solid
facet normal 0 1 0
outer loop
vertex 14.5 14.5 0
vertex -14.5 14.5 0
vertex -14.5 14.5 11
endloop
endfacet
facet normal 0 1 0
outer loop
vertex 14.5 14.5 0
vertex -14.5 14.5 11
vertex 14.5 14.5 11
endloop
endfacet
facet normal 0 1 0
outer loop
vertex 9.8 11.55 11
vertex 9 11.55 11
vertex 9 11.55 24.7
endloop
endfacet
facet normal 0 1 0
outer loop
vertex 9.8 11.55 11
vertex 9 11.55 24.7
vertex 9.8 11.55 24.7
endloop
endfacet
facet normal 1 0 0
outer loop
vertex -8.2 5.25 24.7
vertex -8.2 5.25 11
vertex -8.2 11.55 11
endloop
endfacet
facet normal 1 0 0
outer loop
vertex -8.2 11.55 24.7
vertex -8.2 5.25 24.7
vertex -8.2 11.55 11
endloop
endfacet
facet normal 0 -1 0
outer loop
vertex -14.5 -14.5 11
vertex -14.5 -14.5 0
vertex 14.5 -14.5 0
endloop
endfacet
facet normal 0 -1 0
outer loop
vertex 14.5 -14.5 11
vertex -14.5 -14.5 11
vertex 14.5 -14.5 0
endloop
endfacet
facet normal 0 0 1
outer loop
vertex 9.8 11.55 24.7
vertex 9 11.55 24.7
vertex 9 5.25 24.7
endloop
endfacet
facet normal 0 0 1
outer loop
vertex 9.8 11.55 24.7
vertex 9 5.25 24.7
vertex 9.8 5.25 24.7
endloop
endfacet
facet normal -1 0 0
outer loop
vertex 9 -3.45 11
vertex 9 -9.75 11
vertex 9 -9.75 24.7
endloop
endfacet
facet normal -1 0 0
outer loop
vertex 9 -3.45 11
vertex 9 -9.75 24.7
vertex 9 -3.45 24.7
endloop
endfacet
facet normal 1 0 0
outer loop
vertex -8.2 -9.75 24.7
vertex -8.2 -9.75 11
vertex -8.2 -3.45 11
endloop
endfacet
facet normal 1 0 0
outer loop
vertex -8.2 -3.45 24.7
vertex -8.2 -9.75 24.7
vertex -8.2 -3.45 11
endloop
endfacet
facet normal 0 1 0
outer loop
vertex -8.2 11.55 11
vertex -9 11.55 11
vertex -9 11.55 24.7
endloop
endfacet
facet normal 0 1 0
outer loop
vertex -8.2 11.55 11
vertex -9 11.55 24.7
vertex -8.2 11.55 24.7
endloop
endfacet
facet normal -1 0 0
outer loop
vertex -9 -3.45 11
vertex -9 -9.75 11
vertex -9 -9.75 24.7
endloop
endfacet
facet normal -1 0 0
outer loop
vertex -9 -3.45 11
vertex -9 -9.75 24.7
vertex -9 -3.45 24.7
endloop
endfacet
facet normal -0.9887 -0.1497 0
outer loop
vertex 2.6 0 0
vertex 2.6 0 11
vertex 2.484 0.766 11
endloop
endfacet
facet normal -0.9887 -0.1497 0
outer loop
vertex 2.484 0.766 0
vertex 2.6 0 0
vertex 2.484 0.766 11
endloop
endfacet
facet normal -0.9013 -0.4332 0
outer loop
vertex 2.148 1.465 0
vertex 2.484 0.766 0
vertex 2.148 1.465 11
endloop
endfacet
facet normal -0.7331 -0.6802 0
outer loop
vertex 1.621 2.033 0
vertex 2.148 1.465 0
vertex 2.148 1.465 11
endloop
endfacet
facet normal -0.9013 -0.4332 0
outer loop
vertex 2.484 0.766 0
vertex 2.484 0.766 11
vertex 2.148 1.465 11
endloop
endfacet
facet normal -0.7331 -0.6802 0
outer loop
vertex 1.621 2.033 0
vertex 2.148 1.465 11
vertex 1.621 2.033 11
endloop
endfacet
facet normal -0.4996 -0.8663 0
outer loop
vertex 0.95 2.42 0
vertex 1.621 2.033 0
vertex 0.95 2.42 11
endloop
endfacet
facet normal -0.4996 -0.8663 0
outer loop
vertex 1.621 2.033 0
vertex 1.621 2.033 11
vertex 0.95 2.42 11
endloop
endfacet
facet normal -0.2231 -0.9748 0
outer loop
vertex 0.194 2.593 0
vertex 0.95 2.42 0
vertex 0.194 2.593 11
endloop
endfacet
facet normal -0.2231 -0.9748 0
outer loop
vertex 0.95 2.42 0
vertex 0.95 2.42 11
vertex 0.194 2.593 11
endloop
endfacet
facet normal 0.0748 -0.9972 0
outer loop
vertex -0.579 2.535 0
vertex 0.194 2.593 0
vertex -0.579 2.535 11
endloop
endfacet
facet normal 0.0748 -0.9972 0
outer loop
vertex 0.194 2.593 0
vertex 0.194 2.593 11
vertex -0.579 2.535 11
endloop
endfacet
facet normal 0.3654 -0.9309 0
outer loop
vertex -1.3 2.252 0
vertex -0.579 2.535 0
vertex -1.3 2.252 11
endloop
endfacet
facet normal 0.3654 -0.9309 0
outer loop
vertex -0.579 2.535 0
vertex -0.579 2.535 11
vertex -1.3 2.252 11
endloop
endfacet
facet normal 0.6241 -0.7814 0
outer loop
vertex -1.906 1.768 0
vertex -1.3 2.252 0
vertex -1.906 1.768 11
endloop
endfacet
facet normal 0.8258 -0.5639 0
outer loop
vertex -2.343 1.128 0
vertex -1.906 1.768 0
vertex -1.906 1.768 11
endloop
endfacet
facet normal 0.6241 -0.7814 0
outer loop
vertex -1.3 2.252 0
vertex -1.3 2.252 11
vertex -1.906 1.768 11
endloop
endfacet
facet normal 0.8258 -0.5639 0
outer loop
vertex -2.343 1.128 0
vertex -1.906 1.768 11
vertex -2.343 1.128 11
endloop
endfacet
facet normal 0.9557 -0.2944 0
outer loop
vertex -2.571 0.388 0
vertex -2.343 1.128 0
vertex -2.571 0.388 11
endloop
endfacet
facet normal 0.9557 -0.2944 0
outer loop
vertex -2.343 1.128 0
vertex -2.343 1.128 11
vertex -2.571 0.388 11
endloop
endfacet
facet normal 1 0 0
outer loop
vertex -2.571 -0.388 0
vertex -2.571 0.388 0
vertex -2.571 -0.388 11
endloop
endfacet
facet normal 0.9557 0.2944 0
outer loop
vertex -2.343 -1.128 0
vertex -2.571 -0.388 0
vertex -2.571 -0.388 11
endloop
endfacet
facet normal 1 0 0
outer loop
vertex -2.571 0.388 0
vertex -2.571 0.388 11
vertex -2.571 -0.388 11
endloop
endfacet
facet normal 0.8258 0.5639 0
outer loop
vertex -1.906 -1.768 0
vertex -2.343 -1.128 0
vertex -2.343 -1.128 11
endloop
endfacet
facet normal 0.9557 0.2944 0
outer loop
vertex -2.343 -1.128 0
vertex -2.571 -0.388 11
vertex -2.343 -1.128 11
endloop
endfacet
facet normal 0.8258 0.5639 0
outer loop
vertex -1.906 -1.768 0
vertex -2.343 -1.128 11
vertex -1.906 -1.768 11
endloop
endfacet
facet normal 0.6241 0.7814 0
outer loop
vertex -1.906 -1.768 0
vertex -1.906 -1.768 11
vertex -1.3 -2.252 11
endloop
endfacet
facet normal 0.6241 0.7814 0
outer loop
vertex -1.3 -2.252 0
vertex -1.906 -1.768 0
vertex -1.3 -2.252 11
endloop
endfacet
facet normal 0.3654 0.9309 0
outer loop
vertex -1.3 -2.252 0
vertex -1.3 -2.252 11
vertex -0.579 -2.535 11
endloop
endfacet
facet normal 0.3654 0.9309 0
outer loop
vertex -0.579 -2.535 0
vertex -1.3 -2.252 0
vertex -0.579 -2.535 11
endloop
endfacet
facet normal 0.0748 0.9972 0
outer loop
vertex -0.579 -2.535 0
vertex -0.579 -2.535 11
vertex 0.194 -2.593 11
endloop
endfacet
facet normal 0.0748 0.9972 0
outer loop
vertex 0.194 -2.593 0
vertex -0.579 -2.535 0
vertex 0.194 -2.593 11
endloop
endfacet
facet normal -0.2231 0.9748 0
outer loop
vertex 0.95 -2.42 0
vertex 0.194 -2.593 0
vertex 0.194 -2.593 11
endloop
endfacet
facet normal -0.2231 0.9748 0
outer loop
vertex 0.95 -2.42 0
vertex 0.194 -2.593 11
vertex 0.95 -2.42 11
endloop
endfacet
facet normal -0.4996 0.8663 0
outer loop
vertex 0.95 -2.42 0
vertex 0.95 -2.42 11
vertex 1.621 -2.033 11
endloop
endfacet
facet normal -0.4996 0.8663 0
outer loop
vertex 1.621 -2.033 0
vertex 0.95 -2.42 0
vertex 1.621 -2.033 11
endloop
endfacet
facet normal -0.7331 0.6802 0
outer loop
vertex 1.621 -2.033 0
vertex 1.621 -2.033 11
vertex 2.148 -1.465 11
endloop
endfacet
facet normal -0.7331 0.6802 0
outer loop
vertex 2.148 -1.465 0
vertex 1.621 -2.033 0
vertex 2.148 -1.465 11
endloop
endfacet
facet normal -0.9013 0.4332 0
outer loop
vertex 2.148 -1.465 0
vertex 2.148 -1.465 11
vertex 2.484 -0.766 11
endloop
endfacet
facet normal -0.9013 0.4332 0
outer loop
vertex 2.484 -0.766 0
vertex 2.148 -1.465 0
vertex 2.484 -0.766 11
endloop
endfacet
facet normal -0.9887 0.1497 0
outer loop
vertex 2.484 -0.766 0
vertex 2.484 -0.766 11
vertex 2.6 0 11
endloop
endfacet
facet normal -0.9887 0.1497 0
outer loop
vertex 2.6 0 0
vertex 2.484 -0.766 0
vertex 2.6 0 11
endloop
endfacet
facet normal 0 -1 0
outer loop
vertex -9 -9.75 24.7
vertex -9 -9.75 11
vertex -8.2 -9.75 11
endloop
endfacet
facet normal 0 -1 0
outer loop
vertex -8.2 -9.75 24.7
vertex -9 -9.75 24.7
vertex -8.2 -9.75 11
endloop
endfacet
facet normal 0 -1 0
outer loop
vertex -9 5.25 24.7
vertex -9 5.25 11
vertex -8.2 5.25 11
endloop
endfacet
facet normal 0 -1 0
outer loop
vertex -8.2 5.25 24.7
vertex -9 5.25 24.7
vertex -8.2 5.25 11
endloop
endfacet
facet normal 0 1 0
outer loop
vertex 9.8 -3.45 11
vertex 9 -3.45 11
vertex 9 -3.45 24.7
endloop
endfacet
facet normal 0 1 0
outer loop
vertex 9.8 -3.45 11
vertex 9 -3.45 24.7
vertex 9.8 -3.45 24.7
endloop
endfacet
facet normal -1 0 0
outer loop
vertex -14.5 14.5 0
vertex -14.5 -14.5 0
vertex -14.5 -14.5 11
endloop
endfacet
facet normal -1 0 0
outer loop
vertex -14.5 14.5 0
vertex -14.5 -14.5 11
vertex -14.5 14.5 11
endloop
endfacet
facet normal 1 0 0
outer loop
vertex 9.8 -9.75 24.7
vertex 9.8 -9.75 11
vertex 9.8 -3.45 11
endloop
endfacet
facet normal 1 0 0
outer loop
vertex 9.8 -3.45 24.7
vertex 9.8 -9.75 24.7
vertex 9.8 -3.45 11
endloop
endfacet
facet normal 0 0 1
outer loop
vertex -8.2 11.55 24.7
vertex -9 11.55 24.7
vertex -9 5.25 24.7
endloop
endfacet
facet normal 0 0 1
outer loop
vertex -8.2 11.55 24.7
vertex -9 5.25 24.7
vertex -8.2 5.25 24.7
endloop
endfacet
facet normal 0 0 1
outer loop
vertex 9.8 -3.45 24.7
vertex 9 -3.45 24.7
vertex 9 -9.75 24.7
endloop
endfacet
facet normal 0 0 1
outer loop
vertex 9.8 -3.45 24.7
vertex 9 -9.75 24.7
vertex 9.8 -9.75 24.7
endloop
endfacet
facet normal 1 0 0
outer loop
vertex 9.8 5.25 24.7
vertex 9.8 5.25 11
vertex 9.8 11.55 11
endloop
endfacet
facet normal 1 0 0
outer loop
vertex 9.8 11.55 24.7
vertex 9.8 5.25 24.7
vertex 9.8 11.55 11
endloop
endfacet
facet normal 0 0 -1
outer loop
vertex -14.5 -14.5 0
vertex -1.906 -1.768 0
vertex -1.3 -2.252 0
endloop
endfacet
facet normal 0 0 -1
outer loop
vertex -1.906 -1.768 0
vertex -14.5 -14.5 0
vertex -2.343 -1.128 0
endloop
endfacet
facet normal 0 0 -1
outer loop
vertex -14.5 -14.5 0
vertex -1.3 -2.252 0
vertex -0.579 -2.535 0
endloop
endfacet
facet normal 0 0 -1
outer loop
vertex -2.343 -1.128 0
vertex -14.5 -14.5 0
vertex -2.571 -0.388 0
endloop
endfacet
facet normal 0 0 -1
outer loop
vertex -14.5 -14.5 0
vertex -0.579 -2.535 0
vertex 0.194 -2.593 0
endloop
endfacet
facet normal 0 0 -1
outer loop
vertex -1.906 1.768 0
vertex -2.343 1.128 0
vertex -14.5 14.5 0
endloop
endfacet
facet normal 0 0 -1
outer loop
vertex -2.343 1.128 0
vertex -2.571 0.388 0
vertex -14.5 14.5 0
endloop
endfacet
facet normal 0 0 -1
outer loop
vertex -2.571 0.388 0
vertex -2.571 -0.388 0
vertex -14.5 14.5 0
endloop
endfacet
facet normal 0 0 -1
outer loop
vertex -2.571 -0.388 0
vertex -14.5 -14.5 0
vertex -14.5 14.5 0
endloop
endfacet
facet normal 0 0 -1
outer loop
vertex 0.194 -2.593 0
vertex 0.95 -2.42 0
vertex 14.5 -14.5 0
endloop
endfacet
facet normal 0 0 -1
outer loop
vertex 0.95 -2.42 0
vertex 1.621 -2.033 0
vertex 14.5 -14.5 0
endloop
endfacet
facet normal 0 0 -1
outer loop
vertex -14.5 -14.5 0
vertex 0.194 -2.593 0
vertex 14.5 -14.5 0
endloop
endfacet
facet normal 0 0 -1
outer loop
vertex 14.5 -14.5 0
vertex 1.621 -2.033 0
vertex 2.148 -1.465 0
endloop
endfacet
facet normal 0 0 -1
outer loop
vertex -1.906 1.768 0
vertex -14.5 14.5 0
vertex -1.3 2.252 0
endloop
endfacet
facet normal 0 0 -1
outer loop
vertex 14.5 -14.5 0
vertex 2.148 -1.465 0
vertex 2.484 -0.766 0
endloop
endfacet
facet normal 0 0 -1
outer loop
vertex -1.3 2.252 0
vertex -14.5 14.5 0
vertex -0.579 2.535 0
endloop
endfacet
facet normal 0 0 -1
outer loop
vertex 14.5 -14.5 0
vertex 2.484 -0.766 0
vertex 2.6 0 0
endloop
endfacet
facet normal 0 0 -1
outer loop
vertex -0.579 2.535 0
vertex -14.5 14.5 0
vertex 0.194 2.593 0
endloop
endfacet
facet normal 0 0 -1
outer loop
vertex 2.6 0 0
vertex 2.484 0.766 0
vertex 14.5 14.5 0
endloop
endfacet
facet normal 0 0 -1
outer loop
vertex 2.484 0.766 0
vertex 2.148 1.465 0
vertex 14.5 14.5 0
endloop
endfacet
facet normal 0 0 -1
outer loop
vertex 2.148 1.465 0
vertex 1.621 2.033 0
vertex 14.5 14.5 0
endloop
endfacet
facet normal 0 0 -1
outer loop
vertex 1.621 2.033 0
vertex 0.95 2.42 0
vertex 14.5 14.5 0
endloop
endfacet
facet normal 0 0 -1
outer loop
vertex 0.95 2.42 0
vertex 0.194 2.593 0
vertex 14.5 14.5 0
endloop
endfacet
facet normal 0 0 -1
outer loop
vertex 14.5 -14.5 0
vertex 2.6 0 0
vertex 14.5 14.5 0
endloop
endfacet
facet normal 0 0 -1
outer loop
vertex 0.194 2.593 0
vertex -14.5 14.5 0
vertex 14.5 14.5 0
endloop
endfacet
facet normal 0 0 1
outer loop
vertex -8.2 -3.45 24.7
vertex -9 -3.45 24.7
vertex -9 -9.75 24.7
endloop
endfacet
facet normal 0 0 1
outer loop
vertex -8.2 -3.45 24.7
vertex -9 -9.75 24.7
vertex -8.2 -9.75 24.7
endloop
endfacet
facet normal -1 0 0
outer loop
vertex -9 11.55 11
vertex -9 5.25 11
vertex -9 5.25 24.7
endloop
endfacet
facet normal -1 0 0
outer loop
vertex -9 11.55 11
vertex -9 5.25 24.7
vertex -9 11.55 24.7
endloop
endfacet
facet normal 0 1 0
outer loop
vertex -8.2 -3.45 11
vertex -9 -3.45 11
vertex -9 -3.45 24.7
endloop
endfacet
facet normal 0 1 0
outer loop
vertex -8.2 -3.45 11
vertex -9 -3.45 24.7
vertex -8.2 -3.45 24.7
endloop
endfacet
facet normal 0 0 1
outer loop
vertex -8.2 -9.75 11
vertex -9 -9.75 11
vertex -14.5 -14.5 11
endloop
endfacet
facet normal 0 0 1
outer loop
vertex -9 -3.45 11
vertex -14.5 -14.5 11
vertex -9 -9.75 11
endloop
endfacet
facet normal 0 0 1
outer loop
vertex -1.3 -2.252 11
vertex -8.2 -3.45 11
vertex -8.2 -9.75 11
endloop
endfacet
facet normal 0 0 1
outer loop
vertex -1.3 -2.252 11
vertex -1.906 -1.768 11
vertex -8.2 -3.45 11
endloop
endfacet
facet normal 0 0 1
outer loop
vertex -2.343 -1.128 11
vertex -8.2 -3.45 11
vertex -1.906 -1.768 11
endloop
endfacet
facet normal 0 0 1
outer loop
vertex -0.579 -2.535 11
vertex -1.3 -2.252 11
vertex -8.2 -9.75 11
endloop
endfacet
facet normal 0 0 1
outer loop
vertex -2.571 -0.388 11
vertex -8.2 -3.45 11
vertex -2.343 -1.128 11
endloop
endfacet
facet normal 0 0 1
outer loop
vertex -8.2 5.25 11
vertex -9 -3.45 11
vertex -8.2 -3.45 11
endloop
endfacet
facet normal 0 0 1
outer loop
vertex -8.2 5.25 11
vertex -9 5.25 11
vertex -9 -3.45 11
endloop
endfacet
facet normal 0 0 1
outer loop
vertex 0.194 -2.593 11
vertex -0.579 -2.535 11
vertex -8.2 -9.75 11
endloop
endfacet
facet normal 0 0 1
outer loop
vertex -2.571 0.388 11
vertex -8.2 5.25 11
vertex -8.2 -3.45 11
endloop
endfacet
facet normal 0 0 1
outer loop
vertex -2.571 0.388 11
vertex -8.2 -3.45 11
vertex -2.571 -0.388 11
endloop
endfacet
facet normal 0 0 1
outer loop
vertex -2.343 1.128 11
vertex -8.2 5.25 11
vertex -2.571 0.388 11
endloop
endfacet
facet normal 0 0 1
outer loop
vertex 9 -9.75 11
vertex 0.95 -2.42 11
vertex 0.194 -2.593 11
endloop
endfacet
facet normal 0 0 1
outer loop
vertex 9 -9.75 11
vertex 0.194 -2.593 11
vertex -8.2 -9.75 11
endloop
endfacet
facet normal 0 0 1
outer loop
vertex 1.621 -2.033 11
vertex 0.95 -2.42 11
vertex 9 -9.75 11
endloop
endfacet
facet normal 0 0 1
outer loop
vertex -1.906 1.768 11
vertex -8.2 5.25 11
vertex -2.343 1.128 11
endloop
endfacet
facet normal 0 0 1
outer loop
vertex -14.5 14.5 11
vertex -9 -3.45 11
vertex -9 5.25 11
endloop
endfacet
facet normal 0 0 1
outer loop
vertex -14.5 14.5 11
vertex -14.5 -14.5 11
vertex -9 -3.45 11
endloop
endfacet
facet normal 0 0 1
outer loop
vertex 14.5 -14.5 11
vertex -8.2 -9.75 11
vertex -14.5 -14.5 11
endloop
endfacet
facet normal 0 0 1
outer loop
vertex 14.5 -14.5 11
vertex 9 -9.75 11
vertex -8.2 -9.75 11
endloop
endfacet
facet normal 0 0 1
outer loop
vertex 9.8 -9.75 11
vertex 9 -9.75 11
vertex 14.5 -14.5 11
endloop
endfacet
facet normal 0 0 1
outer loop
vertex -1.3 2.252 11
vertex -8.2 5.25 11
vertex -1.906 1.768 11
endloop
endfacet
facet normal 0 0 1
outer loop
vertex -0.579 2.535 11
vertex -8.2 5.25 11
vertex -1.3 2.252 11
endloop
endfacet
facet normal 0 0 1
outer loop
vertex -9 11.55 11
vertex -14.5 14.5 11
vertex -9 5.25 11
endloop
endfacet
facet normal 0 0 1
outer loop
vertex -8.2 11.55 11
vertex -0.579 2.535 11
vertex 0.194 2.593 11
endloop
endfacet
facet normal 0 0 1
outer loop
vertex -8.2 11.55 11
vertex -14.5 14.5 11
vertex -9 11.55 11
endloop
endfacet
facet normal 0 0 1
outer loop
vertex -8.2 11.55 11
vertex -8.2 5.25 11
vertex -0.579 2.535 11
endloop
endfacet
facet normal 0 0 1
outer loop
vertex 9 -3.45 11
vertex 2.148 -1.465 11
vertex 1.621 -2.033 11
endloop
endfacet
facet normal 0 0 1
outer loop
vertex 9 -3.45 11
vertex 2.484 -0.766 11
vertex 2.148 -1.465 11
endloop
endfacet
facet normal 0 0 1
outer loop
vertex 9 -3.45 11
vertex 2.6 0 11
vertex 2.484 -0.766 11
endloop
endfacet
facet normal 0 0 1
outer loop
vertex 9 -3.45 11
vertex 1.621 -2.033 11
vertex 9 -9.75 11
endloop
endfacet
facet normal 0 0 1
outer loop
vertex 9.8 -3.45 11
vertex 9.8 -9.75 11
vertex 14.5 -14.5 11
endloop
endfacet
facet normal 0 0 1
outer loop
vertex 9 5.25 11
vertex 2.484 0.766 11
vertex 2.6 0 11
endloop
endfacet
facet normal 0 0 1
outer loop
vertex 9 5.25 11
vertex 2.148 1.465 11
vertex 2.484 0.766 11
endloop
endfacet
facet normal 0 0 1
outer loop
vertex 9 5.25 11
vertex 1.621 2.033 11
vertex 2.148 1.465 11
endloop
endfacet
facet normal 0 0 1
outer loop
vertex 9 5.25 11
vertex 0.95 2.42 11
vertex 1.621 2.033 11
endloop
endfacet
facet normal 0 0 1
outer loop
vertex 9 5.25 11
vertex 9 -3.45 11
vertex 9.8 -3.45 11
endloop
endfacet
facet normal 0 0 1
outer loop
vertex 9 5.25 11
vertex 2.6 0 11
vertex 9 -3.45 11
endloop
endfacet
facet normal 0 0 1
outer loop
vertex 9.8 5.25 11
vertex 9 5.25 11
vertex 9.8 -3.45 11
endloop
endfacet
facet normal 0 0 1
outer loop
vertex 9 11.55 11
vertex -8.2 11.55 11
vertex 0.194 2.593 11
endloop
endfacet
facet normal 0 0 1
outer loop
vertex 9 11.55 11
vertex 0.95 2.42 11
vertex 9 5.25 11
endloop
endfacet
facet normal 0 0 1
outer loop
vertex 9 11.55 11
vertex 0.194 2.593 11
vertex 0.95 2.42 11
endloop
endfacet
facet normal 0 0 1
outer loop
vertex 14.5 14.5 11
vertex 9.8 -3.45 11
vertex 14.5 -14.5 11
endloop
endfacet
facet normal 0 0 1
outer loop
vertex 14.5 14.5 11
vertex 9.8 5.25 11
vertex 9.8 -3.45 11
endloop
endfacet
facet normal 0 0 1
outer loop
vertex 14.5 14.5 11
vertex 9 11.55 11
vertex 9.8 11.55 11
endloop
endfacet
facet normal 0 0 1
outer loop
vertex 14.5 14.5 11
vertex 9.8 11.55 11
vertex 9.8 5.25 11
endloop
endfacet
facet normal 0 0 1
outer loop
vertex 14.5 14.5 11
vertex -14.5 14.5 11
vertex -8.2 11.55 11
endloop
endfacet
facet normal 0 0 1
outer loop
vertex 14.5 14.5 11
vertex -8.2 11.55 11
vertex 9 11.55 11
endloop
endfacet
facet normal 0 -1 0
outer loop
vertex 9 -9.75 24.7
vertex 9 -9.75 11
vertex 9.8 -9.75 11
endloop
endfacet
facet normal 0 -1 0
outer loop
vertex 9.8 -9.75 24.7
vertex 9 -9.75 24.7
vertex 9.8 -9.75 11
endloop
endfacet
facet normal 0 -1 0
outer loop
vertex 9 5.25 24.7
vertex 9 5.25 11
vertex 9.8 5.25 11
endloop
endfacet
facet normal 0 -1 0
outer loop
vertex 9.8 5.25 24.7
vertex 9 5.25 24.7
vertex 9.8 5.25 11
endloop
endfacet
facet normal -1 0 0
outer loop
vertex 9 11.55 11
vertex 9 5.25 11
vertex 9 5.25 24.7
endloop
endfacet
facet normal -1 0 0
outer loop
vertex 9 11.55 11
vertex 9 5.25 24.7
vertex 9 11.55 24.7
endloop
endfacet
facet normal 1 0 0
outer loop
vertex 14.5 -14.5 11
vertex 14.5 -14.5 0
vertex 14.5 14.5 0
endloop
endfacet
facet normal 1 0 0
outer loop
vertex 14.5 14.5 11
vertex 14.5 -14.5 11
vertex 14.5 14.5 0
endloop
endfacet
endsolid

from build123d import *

# Parameters (mm, degrees)
F0_W     = 29
F0_H     = 29
F1_DEPTH = 11
F2_R     = 2.6
F3_DEPTH = 11.001
F4_W     = 0.8
F4_H     = 6.3
F5_DEPTH = 13.7


with BuildPart() as f1:
    # F0 (on Top) → F1 (new body)
    with BuildSketch(Plane.XY):
        Rectangle(F0_W, F0_H)
    extrude(amount=F1_DEPTH)

    # F2 (on face) → F3 (cut, through all)
    with BuildSketch(Plane.XY.offset(11)):
        Circle(F2_R)
    extrude(amount=-F3_DEPTH, mode=Mode.SUBTRACT)

    # F4 (on face) → F5 (join)
    with BuildSketch(Plane.XY.offset(11)):
        with Locations((9.4, 8.4)):
            Rectangle(F4_W, F4_H)
        with Locations((9.4, -6.6)):
            Rectangle(F4_W, F4_H)
        with Locations((-8.6, 8.4)):
            Rectangle(F4_W, F4_H)
        with Locations((-8.6, -6.6)):
            Rectangle(F4_W, F4_H)
    extrude(amount=F5_DEPTH)


solid = f1.part
